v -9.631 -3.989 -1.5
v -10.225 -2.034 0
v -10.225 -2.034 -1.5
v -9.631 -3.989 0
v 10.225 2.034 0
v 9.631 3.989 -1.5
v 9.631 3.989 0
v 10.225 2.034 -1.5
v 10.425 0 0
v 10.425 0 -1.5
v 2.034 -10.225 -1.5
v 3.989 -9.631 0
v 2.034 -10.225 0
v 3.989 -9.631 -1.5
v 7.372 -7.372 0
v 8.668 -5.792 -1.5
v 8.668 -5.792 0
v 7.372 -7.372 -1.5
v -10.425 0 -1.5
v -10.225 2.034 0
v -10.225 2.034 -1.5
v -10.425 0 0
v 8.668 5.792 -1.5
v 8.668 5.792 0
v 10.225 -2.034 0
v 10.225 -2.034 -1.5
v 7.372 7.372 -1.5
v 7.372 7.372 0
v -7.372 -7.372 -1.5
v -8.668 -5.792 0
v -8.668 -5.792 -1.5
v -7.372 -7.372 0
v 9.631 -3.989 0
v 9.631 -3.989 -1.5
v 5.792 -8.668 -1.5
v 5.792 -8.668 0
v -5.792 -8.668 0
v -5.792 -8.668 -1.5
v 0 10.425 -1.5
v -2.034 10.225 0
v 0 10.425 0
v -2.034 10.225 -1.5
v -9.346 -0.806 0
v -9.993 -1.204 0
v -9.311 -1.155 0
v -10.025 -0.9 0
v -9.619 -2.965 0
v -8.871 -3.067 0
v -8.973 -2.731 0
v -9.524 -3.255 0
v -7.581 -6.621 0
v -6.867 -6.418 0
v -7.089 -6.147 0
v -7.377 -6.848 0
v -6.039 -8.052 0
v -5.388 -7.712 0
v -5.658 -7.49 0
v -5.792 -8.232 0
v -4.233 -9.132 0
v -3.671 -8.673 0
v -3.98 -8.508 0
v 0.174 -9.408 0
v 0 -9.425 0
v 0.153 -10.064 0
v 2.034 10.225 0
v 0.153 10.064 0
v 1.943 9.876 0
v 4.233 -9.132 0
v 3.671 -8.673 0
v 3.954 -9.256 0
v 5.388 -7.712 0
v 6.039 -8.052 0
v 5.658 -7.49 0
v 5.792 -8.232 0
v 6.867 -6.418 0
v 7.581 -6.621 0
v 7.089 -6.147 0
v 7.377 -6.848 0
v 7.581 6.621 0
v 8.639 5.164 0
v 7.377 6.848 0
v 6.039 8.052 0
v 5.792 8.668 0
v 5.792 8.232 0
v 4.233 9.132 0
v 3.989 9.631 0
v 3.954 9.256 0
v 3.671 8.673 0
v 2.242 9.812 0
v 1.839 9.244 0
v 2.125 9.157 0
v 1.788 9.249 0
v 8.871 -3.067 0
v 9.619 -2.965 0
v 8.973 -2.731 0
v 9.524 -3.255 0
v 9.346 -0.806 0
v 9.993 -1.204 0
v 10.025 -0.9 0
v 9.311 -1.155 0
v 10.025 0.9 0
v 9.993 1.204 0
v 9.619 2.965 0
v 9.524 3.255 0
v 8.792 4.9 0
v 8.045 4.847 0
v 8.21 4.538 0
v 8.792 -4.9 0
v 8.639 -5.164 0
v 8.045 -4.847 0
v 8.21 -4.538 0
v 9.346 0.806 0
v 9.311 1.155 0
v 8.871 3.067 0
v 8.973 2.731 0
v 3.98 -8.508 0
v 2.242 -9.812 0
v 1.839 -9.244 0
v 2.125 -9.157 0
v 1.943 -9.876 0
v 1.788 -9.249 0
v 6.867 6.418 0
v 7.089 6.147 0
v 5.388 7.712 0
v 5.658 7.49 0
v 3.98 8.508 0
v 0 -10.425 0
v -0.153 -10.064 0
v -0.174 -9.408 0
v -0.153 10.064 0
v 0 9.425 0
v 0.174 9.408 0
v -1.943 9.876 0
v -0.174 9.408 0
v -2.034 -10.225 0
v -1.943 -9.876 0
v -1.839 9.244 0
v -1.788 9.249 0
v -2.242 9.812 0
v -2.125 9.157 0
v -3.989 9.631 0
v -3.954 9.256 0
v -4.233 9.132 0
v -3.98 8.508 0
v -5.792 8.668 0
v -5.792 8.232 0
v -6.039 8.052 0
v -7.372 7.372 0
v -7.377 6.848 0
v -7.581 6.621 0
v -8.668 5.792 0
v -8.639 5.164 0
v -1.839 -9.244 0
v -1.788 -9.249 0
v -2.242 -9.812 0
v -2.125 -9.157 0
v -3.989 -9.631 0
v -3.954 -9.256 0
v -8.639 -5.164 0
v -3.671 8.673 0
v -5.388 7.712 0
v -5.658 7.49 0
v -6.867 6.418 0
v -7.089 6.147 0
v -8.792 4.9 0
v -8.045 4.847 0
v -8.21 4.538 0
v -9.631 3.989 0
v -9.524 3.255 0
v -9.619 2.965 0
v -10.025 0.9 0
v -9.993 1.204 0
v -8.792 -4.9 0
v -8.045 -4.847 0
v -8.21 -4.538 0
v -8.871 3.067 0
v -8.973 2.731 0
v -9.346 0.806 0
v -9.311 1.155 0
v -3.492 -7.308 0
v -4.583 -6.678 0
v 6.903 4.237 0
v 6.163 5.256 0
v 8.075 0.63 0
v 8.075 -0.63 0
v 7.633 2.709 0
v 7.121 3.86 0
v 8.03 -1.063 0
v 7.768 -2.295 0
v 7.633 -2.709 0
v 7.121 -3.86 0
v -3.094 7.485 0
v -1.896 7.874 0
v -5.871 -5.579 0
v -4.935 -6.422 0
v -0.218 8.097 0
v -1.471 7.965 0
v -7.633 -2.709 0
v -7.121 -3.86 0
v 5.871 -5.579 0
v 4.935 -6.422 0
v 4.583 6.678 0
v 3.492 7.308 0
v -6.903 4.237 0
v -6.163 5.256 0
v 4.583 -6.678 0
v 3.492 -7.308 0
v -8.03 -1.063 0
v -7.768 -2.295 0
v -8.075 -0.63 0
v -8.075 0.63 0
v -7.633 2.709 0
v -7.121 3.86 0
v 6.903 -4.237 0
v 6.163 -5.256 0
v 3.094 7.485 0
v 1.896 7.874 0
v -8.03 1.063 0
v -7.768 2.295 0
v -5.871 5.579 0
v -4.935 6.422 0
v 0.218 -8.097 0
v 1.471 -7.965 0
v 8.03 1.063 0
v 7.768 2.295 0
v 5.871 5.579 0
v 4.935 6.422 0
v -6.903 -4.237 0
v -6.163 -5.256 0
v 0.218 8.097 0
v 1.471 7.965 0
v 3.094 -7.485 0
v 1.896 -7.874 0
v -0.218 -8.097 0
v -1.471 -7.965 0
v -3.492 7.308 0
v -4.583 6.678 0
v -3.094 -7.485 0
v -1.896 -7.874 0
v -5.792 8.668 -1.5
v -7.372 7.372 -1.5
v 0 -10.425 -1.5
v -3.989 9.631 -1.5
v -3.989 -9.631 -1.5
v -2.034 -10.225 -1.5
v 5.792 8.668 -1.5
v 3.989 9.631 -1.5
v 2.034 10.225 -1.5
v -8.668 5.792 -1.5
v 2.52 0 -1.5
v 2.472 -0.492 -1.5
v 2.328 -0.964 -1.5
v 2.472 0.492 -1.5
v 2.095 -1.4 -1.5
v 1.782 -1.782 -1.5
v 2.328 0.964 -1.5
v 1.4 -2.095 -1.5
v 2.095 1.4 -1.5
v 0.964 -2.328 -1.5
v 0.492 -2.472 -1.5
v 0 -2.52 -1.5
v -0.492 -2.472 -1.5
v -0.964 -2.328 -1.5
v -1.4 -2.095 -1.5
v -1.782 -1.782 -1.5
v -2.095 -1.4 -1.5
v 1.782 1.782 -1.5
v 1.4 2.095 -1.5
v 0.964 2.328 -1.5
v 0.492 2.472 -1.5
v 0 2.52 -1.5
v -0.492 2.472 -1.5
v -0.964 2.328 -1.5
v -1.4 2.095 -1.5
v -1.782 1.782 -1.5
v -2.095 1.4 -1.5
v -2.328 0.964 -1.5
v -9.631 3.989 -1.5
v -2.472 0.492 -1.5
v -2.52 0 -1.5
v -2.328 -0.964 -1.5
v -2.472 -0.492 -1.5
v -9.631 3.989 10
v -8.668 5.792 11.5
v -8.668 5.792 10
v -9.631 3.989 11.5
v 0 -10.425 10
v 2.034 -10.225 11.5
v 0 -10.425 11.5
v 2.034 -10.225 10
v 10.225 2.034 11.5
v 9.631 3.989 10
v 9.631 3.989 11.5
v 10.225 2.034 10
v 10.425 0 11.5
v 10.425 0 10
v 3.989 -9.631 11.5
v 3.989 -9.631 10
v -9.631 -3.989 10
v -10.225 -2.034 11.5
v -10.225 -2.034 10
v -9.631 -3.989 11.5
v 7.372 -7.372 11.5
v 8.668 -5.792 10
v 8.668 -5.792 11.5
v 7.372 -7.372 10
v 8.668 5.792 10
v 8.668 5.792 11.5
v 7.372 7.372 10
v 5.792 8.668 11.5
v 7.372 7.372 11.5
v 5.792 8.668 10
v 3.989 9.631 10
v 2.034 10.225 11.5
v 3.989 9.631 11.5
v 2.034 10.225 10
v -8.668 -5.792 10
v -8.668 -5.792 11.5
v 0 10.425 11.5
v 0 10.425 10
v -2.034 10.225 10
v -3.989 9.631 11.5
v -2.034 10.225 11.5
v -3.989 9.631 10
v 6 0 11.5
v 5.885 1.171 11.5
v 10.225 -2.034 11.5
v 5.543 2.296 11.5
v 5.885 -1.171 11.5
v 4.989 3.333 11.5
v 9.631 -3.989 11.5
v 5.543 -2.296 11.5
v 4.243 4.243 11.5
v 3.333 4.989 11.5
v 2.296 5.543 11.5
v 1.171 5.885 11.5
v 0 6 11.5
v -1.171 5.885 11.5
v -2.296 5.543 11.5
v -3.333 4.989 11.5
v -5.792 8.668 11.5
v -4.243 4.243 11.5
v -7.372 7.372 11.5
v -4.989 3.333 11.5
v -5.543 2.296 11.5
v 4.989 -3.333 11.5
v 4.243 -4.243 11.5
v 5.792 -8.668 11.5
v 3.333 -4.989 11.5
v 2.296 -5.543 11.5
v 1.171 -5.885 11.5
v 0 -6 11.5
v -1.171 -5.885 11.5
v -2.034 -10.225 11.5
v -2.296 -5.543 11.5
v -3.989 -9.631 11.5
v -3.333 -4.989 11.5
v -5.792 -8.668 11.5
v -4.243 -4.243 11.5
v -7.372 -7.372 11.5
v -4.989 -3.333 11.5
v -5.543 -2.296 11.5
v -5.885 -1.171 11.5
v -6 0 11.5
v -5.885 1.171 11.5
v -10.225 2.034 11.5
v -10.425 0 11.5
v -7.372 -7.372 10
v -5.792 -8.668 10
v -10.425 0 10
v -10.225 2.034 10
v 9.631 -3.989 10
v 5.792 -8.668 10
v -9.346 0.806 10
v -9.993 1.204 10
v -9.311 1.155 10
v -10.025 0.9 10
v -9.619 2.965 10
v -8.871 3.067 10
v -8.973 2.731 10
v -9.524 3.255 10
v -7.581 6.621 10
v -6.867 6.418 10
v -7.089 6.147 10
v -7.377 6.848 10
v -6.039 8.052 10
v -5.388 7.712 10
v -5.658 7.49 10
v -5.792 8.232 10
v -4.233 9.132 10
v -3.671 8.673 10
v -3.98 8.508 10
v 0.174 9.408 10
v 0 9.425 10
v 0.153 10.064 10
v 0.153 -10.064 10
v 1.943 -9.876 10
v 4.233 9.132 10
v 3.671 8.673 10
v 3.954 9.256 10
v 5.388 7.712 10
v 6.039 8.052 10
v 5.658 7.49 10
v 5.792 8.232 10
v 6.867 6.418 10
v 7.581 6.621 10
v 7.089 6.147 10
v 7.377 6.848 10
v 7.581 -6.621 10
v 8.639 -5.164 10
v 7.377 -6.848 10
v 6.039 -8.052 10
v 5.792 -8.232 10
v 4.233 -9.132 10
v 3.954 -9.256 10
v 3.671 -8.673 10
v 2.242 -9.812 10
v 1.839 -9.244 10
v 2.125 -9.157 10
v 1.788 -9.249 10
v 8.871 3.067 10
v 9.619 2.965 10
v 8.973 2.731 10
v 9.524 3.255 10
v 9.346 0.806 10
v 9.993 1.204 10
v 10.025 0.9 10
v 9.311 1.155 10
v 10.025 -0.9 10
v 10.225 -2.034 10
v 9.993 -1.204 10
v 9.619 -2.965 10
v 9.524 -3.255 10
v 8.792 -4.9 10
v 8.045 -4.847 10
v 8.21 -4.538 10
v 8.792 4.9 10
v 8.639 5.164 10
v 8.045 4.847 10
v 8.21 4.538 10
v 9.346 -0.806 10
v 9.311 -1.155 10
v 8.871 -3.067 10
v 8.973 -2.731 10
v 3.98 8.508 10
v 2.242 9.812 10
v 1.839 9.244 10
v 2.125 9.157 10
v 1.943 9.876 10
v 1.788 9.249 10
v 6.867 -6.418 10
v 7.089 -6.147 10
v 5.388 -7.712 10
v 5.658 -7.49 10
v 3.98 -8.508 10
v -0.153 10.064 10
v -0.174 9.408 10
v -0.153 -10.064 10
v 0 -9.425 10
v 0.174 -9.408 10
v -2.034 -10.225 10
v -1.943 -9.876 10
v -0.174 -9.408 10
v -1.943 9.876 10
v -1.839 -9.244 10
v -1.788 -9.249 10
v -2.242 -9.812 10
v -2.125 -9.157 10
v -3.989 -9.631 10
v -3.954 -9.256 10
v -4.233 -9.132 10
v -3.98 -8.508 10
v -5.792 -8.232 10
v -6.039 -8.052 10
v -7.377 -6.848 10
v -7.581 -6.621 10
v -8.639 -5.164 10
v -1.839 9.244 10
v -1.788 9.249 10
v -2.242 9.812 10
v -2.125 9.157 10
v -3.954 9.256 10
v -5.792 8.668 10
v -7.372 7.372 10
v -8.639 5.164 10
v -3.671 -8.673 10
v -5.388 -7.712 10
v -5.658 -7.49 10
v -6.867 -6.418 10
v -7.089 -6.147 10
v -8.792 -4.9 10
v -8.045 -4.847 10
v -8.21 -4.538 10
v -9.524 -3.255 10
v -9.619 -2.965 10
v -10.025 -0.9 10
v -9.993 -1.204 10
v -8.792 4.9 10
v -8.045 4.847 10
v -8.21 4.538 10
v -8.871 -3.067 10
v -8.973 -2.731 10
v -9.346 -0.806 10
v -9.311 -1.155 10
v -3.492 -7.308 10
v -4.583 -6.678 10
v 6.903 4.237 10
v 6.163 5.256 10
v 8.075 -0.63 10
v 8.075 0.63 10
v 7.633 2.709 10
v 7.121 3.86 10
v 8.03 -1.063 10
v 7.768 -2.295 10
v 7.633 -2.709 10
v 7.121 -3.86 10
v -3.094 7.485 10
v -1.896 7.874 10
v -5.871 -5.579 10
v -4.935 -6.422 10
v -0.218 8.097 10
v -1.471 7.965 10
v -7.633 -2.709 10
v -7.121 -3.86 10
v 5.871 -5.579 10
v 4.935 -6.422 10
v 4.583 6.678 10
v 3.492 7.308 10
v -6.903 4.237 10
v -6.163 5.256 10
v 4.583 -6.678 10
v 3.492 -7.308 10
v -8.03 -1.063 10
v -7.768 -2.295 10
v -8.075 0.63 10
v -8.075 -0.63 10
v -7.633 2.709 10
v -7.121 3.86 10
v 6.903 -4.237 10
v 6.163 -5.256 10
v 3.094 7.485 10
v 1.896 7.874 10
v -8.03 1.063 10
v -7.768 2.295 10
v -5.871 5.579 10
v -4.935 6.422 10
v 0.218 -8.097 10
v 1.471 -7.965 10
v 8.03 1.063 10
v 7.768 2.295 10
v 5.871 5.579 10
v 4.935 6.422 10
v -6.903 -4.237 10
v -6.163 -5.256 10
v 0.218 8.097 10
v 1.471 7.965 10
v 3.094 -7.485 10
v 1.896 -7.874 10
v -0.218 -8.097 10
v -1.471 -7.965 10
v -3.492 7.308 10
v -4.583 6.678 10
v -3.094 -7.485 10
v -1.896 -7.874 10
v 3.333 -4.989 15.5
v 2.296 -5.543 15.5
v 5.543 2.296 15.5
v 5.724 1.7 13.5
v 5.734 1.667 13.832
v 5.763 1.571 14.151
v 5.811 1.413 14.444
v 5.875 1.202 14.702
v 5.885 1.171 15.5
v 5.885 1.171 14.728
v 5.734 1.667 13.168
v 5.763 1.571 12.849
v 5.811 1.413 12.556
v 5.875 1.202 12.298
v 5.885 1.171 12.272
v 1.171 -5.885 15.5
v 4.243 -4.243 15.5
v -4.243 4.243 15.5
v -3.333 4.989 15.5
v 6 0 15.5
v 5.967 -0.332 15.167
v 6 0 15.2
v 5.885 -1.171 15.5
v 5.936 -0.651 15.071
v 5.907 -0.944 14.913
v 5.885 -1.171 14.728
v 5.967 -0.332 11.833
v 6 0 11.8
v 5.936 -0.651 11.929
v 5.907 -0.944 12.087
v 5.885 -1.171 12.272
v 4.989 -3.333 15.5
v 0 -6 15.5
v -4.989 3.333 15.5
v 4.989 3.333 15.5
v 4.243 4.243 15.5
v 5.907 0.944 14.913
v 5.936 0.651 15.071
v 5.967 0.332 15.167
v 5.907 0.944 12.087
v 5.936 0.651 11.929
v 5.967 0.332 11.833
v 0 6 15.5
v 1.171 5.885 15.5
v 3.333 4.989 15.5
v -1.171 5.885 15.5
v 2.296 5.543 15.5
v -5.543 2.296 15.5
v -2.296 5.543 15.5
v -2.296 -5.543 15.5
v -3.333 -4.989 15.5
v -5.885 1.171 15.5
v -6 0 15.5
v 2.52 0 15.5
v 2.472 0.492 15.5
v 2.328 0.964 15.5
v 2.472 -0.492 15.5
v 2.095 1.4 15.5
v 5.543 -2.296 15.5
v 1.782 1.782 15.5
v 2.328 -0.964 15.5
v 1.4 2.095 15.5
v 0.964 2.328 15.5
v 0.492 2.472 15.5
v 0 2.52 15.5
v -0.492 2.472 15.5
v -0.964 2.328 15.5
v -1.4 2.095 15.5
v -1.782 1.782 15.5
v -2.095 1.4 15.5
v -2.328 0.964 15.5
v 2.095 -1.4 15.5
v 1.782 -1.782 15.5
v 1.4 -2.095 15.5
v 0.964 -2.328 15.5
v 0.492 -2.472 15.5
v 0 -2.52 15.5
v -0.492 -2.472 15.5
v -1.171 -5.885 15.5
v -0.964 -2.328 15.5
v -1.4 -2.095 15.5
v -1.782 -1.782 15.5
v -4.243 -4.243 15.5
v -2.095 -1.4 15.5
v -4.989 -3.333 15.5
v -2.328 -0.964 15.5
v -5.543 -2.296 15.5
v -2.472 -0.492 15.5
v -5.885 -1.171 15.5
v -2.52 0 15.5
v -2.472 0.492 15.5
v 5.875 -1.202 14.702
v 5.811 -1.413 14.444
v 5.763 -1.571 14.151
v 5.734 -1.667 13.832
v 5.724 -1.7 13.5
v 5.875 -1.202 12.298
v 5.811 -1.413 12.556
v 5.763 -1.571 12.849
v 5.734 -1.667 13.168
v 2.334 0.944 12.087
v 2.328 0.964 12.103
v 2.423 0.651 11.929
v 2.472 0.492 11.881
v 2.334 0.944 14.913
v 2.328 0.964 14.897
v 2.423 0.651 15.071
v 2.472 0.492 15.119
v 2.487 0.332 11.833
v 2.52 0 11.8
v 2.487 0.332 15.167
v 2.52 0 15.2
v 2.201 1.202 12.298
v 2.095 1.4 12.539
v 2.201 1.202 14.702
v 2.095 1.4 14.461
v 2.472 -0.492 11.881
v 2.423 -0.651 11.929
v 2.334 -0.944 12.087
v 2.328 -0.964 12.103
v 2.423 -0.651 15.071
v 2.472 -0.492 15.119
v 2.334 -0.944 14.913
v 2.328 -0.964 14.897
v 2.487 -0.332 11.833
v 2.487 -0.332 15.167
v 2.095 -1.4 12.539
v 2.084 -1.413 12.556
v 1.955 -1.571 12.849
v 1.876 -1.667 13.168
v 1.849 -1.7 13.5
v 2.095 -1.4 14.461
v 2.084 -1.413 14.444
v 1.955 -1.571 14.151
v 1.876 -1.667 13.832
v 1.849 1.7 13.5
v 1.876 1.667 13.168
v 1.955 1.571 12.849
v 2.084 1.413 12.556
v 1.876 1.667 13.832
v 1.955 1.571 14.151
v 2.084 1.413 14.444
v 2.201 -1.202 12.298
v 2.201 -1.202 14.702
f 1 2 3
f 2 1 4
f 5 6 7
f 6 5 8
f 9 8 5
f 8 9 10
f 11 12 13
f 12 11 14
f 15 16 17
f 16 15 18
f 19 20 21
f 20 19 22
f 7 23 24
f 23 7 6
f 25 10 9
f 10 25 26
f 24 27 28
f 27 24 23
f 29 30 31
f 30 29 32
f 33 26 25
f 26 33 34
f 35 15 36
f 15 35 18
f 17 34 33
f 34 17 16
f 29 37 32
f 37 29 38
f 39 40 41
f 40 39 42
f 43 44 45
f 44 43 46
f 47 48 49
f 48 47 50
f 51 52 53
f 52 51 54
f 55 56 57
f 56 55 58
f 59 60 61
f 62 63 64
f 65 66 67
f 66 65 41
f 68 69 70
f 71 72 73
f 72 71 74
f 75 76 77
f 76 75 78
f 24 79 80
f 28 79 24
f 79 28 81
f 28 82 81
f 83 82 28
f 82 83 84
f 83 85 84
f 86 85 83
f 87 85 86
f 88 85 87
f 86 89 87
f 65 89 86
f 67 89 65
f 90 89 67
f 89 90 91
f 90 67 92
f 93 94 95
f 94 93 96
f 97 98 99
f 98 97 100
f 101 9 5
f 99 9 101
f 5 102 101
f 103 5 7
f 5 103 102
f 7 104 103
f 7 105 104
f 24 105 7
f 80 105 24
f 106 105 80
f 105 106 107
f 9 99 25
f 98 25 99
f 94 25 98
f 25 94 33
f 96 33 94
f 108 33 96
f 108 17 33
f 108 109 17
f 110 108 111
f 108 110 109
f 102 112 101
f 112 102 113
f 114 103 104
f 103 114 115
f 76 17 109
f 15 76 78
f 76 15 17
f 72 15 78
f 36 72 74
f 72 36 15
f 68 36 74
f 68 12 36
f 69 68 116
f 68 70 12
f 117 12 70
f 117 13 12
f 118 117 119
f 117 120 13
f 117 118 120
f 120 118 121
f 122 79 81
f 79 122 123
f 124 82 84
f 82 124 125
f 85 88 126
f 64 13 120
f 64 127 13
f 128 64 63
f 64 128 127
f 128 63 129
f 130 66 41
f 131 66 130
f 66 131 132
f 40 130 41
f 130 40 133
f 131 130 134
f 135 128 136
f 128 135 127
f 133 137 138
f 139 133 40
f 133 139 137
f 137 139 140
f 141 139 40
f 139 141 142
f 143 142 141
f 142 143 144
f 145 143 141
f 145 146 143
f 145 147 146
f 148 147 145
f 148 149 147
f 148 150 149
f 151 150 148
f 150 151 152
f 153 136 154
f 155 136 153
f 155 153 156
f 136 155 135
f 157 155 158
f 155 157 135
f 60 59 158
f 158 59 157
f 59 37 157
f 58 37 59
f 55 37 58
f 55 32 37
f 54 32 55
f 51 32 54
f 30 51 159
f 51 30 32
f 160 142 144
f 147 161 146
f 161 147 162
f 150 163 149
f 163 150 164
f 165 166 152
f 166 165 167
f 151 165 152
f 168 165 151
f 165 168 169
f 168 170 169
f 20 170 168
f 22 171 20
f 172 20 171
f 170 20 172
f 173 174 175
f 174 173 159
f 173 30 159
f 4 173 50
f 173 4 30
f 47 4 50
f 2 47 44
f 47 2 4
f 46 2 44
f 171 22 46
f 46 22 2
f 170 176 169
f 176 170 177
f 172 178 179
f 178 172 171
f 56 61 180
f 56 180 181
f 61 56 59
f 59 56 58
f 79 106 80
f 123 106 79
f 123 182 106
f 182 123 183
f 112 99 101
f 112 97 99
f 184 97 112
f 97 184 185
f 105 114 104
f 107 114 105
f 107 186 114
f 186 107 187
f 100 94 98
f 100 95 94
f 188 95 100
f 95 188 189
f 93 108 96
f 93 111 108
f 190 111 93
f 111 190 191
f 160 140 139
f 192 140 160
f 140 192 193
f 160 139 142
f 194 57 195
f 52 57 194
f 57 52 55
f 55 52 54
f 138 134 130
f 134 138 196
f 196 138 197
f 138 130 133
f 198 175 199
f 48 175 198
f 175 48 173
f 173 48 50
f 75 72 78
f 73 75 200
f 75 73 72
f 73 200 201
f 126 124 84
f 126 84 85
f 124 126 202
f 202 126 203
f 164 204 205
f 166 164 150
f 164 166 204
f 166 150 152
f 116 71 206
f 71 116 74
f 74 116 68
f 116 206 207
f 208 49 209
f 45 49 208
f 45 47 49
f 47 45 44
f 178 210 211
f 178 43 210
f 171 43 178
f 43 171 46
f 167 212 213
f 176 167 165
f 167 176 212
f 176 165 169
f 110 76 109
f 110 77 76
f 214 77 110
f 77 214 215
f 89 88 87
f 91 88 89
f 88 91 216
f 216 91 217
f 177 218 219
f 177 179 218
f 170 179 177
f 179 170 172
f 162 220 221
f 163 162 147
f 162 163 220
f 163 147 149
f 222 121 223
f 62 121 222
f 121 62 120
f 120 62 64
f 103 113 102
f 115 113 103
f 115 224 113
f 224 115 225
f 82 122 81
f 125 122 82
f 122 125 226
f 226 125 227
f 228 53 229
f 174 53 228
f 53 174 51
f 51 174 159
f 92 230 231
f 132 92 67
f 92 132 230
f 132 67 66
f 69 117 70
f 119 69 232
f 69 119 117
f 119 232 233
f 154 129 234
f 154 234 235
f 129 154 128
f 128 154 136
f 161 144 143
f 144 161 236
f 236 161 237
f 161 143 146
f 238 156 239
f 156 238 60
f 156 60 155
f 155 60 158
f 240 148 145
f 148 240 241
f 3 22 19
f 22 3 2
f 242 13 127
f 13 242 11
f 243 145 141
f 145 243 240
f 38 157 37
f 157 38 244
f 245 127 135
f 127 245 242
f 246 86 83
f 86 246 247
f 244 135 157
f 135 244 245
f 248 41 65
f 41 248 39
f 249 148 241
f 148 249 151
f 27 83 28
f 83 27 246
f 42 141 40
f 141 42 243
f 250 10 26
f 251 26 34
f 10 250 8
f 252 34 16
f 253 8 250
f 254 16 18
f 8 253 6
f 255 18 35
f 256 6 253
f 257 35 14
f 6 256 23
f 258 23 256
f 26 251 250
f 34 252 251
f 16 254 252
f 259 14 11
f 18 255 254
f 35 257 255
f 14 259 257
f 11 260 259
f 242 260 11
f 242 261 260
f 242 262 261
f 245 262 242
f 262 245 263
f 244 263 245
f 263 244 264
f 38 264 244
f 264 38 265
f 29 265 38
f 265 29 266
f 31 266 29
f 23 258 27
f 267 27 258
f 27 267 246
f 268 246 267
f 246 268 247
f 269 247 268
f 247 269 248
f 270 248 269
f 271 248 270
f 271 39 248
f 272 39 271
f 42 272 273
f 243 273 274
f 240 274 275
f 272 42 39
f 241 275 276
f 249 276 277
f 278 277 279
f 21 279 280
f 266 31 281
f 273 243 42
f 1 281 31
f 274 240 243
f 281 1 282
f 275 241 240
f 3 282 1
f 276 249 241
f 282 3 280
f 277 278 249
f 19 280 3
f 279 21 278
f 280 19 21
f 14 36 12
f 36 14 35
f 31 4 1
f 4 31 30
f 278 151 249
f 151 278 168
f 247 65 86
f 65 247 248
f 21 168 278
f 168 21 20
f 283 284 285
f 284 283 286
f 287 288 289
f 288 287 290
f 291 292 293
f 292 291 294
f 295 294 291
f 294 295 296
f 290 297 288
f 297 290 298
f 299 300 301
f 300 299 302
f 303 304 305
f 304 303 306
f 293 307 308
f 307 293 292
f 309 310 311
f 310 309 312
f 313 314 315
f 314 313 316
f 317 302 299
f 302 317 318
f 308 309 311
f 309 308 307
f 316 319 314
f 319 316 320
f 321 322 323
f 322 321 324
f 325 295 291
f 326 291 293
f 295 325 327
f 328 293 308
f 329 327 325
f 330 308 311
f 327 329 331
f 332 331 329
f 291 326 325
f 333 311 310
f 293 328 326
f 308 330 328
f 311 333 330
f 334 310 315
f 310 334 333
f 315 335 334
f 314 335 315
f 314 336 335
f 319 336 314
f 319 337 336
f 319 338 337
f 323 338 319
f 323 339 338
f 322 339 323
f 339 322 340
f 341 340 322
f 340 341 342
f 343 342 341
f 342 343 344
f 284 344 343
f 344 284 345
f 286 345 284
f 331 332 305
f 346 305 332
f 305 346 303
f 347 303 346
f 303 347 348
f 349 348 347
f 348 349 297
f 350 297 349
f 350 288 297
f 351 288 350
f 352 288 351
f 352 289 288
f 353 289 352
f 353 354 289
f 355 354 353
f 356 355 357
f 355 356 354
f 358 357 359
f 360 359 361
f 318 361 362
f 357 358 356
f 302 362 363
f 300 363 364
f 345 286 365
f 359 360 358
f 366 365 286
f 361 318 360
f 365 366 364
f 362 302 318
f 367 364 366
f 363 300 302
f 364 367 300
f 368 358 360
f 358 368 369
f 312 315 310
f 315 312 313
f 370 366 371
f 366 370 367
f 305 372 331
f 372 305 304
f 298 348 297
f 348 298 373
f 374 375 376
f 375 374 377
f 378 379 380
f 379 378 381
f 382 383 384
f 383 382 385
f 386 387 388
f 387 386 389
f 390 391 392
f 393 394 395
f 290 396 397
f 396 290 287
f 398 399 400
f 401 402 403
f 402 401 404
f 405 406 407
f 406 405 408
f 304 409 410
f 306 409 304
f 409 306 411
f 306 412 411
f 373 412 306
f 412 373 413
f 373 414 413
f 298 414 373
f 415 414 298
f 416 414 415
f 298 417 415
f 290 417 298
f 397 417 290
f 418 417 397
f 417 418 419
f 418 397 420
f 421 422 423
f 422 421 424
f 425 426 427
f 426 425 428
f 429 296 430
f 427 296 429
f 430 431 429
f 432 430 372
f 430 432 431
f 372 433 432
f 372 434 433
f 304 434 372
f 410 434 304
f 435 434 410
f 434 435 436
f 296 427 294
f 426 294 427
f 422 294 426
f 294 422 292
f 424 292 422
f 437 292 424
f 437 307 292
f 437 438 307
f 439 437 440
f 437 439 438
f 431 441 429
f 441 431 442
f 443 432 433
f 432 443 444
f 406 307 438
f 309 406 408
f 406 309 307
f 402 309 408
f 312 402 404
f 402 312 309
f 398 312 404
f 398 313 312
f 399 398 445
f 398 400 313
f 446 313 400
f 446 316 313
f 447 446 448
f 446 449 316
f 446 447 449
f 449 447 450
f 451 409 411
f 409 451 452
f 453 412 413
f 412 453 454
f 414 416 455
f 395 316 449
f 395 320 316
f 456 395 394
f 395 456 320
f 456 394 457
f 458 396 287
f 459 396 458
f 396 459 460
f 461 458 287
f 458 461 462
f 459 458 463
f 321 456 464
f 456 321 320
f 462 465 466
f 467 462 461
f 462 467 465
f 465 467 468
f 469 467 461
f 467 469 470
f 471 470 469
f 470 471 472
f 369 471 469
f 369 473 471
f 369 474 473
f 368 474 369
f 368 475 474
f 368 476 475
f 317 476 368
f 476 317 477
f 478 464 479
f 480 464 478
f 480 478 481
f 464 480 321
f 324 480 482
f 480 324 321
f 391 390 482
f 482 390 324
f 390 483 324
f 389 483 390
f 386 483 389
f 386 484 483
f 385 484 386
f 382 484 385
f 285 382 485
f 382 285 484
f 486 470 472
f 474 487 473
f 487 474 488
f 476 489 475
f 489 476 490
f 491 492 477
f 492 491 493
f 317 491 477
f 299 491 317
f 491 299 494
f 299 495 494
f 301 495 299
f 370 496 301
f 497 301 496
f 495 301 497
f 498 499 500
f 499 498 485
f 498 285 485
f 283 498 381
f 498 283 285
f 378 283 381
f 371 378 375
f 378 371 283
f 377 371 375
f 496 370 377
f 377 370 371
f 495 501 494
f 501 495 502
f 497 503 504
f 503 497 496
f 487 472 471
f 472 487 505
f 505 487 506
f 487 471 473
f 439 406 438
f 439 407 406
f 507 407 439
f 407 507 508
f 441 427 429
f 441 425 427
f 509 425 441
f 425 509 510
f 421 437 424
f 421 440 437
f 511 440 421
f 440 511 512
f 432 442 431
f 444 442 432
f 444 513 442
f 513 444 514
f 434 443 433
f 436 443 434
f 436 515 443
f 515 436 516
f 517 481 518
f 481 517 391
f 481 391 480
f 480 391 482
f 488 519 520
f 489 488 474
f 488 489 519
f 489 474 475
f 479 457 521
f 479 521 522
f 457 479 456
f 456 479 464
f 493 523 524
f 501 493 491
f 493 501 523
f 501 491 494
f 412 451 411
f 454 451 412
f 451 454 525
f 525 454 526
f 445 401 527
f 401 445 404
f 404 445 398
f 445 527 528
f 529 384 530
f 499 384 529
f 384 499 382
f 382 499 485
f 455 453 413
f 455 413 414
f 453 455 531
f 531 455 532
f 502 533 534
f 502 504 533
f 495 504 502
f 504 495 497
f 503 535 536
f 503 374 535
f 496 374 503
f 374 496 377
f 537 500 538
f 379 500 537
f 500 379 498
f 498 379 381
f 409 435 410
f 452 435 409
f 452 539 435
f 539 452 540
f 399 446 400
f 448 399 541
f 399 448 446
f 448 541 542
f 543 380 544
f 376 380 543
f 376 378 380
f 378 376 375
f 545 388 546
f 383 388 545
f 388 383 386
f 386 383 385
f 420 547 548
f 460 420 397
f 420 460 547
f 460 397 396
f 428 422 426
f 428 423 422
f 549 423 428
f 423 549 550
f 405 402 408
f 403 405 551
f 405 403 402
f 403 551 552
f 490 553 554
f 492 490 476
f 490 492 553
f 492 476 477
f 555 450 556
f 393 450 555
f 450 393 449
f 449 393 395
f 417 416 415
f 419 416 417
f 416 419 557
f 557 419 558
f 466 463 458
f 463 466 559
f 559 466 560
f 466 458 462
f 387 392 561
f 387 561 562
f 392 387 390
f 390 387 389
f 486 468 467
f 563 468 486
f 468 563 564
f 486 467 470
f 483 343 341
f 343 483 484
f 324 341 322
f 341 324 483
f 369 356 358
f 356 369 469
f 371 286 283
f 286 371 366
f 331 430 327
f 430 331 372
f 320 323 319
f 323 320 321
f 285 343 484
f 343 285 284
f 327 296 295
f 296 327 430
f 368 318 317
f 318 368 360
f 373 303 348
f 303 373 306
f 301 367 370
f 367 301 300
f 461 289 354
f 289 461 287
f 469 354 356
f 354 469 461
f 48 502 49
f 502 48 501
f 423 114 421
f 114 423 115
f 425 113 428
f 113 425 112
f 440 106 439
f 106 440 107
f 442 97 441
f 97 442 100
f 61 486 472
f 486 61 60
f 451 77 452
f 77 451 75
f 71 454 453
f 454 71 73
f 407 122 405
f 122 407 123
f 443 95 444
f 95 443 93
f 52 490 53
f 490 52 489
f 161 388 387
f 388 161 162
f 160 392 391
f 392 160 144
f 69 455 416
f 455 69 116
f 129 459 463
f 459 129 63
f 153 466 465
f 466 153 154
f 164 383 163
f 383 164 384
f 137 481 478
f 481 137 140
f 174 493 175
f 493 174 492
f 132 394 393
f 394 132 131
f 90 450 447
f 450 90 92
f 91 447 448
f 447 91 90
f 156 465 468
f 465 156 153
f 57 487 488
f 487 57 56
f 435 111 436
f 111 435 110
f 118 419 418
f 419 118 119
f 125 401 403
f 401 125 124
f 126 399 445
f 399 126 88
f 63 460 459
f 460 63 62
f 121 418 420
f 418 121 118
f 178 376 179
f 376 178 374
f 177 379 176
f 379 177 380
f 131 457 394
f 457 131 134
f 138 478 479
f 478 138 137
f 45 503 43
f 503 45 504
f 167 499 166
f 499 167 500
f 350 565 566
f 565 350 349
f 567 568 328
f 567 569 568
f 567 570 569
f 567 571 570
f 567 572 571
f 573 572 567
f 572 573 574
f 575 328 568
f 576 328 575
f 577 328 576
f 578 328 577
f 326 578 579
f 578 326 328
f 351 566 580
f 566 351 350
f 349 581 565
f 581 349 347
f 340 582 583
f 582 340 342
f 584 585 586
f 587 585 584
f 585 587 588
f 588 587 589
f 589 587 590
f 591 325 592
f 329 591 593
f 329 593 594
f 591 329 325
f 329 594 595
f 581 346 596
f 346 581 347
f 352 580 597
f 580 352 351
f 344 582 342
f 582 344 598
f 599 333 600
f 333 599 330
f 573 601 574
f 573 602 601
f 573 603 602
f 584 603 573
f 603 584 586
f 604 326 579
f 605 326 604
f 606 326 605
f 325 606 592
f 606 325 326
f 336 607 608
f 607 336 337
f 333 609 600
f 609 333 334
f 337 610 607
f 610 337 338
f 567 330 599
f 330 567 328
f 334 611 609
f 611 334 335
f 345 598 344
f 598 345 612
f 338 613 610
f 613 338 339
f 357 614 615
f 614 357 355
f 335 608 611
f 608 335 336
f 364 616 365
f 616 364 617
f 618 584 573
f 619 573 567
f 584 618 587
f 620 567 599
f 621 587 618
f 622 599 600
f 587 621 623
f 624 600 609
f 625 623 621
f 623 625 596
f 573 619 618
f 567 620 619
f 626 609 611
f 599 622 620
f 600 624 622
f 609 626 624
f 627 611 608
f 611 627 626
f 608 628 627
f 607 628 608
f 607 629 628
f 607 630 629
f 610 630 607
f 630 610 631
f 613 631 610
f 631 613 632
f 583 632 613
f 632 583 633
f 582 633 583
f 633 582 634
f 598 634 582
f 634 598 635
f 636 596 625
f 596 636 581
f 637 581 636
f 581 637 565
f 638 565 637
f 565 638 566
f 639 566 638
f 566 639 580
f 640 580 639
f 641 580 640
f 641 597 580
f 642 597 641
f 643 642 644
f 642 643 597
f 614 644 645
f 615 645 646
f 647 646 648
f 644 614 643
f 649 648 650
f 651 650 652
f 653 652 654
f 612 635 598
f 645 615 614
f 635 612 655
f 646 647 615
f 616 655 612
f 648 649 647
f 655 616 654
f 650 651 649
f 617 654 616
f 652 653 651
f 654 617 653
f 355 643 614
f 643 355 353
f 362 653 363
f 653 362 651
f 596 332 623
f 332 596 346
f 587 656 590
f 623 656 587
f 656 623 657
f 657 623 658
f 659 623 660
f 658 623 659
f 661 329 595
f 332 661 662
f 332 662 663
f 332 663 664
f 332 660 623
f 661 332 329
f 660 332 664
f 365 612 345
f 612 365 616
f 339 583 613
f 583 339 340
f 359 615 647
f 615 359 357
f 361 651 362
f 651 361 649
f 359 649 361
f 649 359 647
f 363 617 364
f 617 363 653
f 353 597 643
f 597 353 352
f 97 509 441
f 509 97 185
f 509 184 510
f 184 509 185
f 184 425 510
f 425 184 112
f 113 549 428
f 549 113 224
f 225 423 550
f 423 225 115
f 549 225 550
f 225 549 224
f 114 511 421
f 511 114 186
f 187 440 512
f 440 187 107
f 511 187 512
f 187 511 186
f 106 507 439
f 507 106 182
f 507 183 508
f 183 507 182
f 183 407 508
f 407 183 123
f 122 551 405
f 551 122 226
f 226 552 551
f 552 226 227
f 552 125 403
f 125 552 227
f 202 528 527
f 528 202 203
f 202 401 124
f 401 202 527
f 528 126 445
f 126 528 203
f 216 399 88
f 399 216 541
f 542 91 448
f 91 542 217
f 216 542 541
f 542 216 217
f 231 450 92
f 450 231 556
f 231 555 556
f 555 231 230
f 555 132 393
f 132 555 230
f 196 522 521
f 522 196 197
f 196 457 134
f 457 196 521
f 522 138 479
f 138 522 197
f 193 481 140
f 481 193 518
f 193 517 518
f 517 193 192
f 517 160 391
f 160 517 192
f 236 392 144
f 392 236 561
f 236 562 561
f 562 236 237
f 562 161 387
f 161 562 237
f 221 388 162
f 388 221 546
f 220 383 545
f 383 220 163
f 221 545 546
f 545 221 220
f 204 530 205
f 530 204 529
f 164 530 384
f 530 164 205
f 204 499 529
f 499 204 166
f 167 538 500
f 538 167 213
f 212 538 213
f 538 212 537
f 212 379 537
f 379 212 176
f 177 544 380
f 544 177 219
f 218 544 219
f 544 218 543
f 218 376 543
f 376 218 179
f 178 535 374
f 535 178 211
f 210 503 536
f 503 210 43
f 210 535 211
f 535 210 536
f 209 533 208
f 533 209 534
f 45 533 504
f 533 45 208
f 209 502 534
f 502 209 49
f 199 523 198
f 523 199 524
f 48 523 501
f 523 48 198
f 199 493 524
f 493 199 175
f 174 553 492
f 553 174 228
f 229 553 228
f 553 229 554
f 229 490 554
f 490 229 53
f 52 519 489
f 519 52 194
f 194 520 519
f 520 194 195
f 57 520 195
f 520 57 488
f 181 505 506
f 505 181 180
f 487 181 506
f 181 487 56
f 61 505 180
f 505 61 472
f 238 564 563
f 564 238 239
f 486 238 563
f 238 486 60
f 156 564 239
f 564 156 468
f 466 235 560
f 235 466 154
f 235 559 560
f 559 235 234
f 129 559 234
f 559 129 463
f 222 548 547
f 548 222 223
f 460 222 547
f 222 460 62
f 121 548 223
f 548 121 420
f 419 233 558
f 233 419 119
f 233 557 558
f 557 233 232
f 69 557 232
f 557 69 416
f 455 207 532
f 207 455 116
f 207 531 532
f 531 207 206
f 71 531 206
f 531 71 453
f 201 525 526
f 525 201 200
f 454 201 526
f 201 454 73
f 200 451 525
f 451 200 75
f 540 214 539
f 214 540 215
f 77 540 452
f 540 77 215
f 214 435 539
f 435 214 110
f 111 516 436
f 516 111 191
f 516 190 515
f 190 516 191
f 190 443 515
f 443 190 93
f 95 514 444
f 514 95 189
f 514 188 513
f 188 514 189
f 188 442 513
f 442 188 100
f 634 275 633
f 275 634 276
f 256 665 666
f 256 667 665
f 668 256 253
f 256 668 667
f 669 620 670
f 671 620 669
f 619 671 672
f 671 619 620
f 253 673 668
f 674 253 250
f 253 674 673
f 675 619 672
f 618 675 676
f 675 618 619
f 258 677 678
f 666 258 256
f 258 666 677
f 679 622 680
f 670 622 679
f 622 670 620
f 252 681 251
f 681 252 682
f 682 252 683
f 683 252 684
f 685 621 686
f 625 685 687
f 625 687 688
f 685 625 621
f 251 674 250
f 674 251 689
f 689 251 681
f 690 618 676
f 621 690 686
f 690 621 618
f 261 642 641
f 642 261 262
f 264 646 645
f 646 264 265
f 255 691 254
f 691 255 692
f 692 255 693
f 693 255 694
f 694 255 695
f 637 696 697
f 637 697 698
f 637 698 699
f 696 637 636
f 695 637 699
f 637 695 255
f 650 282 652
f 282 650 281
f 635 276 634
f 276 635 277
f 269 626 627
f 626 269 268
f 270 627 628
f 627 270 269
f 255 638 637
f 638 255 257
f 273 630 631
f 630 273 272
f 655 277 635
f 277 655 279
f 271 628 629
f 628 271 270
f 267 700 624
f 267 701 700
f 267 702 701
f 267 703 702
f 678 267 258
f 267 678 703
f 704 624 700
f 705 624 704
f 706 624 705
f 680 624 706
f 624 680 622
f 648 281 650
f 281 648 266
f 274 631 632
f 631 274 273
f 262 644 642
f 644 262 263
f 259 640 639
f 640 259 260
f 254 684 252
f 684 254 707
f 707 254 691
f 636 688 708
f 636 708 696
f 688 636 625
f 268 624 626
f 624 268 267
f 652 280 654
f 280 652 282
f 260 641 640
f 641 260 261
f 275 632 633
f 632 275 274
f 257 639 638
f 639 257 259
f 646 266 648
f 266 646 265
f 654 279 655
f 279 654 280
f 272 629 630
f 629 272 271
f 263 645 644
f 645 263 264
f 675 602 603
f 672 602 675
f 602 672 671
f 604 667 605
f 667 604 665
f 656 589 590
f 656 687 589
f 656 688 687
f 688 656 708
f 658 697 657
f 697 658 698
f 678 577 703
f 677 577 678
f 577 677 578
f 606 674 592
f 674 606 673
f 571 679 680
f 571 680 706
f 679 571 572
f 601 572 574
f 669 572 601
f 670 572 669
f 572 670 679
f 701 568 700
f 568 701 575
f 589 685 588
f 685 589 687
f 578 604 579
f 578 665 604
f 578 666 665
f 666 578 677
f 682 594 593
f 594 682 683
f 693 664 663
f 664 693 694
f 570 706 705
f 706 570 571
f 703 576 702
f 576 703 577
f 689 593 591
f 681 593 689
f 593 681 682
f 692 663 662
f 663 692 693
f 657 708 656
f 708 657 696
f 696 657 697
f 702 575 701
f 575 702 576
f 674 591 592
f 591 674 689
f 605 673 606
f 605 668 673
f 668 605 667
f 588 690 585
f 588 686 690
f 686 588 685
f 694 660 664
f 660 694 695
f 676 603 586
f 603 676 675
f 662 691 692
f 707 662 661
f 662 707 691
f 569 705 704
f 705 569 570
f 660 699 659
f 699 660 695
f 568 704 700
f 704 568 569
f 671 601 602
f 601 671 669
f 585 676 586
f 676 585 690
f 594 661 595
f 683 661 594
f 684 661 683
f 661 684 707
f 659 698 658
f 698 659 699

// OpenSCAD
$fn = 32;

// ----------------------------------------------------------------------
// Timing pulley: GT2 30T, pitch 2 mm, 20.85 mm x 17 mm
// ----------------------------------------------------------------------

// --- parameters (mm) ---
pitch = 2;                // belt pitch
teeth = 30;               // number of grooves
belt_w = 10;              // belt width between the flanges
tip_d = 18.85;            // tip circle diameter
root_d = 17.35;           // groove bottom diameter
groove_h = 0.75;          // groove depth
tooth_w = 1.5;            // groove width at the tip circle
flange_d = 20.85;         // flange diameter
flange_t = 1.5;           // flange thickness
spigot_d = 15.75;         // flange spigot, sunk into the rim
spigot_h = 1.2;           // spigot depth into the rim
bore_d = 5.04;            // shaft bore
hub_d = 12;               // hub diameter
hub_h = 4;                // hub above the flange
bottom_z = -1.5;          // lowest point of the pulley
top_z = 15.5;             // highest point of the pulley
set_d = 3.4;              // set screw tap hole

module rim() {
  cylinder(h = belt_w, d = tip_d);
}

module groove_cutter() {
  /* belt tooth groove: deeper than wide, cut through the belt width */
  translate([root_d / 2, 0, 0])
    linear_extrude(height = belt_w)
      polygon(points = [[-0.6, -tooth_w * 0.42], [groove_h + 0.6, -tooth_w * 0.6],
                        [groove_h + 0.6, tooth_w * 0.6], [-0.6, tooth_w * 0.42]]);
}

module flanges() {
  translate([0, 0, -flange_t]) cylinder(h = flange_t, d = flange_d);
  translate([0, 0, belt_w]) cylinder(h = flange_t, d = flange_d);
  translate([0, 0, -spigot_h]) cylinder(h = spigot_h + 0.6, d = spigot_d);
  translate([0, 0, belt_w - 0.6]) cylinder(h = spigot_h + 0.6, d = spigot_d);
}

module hub() {
  translate([0, 0, bottom_z]) cylinder(h = top_z - bottom_z, d = hub_d);
}

difference() {
  union() {
    rim();
    hub();
    flanges();
  }
  for (i = [0 : teeth - 1]) rotate([0, 0, i * 360 / teeth]) groove_cutter();
  translate([0, 0, bottom_z - 1]) cylinder(h = top_z - bottom_z + 2, d = bore_d);
  translate([-1, 0, top_z - hub_h * 0.5]) rotate([0, 90, 0]) cylinder(h = hub_d / 2 + 3, d = set_d);
}
